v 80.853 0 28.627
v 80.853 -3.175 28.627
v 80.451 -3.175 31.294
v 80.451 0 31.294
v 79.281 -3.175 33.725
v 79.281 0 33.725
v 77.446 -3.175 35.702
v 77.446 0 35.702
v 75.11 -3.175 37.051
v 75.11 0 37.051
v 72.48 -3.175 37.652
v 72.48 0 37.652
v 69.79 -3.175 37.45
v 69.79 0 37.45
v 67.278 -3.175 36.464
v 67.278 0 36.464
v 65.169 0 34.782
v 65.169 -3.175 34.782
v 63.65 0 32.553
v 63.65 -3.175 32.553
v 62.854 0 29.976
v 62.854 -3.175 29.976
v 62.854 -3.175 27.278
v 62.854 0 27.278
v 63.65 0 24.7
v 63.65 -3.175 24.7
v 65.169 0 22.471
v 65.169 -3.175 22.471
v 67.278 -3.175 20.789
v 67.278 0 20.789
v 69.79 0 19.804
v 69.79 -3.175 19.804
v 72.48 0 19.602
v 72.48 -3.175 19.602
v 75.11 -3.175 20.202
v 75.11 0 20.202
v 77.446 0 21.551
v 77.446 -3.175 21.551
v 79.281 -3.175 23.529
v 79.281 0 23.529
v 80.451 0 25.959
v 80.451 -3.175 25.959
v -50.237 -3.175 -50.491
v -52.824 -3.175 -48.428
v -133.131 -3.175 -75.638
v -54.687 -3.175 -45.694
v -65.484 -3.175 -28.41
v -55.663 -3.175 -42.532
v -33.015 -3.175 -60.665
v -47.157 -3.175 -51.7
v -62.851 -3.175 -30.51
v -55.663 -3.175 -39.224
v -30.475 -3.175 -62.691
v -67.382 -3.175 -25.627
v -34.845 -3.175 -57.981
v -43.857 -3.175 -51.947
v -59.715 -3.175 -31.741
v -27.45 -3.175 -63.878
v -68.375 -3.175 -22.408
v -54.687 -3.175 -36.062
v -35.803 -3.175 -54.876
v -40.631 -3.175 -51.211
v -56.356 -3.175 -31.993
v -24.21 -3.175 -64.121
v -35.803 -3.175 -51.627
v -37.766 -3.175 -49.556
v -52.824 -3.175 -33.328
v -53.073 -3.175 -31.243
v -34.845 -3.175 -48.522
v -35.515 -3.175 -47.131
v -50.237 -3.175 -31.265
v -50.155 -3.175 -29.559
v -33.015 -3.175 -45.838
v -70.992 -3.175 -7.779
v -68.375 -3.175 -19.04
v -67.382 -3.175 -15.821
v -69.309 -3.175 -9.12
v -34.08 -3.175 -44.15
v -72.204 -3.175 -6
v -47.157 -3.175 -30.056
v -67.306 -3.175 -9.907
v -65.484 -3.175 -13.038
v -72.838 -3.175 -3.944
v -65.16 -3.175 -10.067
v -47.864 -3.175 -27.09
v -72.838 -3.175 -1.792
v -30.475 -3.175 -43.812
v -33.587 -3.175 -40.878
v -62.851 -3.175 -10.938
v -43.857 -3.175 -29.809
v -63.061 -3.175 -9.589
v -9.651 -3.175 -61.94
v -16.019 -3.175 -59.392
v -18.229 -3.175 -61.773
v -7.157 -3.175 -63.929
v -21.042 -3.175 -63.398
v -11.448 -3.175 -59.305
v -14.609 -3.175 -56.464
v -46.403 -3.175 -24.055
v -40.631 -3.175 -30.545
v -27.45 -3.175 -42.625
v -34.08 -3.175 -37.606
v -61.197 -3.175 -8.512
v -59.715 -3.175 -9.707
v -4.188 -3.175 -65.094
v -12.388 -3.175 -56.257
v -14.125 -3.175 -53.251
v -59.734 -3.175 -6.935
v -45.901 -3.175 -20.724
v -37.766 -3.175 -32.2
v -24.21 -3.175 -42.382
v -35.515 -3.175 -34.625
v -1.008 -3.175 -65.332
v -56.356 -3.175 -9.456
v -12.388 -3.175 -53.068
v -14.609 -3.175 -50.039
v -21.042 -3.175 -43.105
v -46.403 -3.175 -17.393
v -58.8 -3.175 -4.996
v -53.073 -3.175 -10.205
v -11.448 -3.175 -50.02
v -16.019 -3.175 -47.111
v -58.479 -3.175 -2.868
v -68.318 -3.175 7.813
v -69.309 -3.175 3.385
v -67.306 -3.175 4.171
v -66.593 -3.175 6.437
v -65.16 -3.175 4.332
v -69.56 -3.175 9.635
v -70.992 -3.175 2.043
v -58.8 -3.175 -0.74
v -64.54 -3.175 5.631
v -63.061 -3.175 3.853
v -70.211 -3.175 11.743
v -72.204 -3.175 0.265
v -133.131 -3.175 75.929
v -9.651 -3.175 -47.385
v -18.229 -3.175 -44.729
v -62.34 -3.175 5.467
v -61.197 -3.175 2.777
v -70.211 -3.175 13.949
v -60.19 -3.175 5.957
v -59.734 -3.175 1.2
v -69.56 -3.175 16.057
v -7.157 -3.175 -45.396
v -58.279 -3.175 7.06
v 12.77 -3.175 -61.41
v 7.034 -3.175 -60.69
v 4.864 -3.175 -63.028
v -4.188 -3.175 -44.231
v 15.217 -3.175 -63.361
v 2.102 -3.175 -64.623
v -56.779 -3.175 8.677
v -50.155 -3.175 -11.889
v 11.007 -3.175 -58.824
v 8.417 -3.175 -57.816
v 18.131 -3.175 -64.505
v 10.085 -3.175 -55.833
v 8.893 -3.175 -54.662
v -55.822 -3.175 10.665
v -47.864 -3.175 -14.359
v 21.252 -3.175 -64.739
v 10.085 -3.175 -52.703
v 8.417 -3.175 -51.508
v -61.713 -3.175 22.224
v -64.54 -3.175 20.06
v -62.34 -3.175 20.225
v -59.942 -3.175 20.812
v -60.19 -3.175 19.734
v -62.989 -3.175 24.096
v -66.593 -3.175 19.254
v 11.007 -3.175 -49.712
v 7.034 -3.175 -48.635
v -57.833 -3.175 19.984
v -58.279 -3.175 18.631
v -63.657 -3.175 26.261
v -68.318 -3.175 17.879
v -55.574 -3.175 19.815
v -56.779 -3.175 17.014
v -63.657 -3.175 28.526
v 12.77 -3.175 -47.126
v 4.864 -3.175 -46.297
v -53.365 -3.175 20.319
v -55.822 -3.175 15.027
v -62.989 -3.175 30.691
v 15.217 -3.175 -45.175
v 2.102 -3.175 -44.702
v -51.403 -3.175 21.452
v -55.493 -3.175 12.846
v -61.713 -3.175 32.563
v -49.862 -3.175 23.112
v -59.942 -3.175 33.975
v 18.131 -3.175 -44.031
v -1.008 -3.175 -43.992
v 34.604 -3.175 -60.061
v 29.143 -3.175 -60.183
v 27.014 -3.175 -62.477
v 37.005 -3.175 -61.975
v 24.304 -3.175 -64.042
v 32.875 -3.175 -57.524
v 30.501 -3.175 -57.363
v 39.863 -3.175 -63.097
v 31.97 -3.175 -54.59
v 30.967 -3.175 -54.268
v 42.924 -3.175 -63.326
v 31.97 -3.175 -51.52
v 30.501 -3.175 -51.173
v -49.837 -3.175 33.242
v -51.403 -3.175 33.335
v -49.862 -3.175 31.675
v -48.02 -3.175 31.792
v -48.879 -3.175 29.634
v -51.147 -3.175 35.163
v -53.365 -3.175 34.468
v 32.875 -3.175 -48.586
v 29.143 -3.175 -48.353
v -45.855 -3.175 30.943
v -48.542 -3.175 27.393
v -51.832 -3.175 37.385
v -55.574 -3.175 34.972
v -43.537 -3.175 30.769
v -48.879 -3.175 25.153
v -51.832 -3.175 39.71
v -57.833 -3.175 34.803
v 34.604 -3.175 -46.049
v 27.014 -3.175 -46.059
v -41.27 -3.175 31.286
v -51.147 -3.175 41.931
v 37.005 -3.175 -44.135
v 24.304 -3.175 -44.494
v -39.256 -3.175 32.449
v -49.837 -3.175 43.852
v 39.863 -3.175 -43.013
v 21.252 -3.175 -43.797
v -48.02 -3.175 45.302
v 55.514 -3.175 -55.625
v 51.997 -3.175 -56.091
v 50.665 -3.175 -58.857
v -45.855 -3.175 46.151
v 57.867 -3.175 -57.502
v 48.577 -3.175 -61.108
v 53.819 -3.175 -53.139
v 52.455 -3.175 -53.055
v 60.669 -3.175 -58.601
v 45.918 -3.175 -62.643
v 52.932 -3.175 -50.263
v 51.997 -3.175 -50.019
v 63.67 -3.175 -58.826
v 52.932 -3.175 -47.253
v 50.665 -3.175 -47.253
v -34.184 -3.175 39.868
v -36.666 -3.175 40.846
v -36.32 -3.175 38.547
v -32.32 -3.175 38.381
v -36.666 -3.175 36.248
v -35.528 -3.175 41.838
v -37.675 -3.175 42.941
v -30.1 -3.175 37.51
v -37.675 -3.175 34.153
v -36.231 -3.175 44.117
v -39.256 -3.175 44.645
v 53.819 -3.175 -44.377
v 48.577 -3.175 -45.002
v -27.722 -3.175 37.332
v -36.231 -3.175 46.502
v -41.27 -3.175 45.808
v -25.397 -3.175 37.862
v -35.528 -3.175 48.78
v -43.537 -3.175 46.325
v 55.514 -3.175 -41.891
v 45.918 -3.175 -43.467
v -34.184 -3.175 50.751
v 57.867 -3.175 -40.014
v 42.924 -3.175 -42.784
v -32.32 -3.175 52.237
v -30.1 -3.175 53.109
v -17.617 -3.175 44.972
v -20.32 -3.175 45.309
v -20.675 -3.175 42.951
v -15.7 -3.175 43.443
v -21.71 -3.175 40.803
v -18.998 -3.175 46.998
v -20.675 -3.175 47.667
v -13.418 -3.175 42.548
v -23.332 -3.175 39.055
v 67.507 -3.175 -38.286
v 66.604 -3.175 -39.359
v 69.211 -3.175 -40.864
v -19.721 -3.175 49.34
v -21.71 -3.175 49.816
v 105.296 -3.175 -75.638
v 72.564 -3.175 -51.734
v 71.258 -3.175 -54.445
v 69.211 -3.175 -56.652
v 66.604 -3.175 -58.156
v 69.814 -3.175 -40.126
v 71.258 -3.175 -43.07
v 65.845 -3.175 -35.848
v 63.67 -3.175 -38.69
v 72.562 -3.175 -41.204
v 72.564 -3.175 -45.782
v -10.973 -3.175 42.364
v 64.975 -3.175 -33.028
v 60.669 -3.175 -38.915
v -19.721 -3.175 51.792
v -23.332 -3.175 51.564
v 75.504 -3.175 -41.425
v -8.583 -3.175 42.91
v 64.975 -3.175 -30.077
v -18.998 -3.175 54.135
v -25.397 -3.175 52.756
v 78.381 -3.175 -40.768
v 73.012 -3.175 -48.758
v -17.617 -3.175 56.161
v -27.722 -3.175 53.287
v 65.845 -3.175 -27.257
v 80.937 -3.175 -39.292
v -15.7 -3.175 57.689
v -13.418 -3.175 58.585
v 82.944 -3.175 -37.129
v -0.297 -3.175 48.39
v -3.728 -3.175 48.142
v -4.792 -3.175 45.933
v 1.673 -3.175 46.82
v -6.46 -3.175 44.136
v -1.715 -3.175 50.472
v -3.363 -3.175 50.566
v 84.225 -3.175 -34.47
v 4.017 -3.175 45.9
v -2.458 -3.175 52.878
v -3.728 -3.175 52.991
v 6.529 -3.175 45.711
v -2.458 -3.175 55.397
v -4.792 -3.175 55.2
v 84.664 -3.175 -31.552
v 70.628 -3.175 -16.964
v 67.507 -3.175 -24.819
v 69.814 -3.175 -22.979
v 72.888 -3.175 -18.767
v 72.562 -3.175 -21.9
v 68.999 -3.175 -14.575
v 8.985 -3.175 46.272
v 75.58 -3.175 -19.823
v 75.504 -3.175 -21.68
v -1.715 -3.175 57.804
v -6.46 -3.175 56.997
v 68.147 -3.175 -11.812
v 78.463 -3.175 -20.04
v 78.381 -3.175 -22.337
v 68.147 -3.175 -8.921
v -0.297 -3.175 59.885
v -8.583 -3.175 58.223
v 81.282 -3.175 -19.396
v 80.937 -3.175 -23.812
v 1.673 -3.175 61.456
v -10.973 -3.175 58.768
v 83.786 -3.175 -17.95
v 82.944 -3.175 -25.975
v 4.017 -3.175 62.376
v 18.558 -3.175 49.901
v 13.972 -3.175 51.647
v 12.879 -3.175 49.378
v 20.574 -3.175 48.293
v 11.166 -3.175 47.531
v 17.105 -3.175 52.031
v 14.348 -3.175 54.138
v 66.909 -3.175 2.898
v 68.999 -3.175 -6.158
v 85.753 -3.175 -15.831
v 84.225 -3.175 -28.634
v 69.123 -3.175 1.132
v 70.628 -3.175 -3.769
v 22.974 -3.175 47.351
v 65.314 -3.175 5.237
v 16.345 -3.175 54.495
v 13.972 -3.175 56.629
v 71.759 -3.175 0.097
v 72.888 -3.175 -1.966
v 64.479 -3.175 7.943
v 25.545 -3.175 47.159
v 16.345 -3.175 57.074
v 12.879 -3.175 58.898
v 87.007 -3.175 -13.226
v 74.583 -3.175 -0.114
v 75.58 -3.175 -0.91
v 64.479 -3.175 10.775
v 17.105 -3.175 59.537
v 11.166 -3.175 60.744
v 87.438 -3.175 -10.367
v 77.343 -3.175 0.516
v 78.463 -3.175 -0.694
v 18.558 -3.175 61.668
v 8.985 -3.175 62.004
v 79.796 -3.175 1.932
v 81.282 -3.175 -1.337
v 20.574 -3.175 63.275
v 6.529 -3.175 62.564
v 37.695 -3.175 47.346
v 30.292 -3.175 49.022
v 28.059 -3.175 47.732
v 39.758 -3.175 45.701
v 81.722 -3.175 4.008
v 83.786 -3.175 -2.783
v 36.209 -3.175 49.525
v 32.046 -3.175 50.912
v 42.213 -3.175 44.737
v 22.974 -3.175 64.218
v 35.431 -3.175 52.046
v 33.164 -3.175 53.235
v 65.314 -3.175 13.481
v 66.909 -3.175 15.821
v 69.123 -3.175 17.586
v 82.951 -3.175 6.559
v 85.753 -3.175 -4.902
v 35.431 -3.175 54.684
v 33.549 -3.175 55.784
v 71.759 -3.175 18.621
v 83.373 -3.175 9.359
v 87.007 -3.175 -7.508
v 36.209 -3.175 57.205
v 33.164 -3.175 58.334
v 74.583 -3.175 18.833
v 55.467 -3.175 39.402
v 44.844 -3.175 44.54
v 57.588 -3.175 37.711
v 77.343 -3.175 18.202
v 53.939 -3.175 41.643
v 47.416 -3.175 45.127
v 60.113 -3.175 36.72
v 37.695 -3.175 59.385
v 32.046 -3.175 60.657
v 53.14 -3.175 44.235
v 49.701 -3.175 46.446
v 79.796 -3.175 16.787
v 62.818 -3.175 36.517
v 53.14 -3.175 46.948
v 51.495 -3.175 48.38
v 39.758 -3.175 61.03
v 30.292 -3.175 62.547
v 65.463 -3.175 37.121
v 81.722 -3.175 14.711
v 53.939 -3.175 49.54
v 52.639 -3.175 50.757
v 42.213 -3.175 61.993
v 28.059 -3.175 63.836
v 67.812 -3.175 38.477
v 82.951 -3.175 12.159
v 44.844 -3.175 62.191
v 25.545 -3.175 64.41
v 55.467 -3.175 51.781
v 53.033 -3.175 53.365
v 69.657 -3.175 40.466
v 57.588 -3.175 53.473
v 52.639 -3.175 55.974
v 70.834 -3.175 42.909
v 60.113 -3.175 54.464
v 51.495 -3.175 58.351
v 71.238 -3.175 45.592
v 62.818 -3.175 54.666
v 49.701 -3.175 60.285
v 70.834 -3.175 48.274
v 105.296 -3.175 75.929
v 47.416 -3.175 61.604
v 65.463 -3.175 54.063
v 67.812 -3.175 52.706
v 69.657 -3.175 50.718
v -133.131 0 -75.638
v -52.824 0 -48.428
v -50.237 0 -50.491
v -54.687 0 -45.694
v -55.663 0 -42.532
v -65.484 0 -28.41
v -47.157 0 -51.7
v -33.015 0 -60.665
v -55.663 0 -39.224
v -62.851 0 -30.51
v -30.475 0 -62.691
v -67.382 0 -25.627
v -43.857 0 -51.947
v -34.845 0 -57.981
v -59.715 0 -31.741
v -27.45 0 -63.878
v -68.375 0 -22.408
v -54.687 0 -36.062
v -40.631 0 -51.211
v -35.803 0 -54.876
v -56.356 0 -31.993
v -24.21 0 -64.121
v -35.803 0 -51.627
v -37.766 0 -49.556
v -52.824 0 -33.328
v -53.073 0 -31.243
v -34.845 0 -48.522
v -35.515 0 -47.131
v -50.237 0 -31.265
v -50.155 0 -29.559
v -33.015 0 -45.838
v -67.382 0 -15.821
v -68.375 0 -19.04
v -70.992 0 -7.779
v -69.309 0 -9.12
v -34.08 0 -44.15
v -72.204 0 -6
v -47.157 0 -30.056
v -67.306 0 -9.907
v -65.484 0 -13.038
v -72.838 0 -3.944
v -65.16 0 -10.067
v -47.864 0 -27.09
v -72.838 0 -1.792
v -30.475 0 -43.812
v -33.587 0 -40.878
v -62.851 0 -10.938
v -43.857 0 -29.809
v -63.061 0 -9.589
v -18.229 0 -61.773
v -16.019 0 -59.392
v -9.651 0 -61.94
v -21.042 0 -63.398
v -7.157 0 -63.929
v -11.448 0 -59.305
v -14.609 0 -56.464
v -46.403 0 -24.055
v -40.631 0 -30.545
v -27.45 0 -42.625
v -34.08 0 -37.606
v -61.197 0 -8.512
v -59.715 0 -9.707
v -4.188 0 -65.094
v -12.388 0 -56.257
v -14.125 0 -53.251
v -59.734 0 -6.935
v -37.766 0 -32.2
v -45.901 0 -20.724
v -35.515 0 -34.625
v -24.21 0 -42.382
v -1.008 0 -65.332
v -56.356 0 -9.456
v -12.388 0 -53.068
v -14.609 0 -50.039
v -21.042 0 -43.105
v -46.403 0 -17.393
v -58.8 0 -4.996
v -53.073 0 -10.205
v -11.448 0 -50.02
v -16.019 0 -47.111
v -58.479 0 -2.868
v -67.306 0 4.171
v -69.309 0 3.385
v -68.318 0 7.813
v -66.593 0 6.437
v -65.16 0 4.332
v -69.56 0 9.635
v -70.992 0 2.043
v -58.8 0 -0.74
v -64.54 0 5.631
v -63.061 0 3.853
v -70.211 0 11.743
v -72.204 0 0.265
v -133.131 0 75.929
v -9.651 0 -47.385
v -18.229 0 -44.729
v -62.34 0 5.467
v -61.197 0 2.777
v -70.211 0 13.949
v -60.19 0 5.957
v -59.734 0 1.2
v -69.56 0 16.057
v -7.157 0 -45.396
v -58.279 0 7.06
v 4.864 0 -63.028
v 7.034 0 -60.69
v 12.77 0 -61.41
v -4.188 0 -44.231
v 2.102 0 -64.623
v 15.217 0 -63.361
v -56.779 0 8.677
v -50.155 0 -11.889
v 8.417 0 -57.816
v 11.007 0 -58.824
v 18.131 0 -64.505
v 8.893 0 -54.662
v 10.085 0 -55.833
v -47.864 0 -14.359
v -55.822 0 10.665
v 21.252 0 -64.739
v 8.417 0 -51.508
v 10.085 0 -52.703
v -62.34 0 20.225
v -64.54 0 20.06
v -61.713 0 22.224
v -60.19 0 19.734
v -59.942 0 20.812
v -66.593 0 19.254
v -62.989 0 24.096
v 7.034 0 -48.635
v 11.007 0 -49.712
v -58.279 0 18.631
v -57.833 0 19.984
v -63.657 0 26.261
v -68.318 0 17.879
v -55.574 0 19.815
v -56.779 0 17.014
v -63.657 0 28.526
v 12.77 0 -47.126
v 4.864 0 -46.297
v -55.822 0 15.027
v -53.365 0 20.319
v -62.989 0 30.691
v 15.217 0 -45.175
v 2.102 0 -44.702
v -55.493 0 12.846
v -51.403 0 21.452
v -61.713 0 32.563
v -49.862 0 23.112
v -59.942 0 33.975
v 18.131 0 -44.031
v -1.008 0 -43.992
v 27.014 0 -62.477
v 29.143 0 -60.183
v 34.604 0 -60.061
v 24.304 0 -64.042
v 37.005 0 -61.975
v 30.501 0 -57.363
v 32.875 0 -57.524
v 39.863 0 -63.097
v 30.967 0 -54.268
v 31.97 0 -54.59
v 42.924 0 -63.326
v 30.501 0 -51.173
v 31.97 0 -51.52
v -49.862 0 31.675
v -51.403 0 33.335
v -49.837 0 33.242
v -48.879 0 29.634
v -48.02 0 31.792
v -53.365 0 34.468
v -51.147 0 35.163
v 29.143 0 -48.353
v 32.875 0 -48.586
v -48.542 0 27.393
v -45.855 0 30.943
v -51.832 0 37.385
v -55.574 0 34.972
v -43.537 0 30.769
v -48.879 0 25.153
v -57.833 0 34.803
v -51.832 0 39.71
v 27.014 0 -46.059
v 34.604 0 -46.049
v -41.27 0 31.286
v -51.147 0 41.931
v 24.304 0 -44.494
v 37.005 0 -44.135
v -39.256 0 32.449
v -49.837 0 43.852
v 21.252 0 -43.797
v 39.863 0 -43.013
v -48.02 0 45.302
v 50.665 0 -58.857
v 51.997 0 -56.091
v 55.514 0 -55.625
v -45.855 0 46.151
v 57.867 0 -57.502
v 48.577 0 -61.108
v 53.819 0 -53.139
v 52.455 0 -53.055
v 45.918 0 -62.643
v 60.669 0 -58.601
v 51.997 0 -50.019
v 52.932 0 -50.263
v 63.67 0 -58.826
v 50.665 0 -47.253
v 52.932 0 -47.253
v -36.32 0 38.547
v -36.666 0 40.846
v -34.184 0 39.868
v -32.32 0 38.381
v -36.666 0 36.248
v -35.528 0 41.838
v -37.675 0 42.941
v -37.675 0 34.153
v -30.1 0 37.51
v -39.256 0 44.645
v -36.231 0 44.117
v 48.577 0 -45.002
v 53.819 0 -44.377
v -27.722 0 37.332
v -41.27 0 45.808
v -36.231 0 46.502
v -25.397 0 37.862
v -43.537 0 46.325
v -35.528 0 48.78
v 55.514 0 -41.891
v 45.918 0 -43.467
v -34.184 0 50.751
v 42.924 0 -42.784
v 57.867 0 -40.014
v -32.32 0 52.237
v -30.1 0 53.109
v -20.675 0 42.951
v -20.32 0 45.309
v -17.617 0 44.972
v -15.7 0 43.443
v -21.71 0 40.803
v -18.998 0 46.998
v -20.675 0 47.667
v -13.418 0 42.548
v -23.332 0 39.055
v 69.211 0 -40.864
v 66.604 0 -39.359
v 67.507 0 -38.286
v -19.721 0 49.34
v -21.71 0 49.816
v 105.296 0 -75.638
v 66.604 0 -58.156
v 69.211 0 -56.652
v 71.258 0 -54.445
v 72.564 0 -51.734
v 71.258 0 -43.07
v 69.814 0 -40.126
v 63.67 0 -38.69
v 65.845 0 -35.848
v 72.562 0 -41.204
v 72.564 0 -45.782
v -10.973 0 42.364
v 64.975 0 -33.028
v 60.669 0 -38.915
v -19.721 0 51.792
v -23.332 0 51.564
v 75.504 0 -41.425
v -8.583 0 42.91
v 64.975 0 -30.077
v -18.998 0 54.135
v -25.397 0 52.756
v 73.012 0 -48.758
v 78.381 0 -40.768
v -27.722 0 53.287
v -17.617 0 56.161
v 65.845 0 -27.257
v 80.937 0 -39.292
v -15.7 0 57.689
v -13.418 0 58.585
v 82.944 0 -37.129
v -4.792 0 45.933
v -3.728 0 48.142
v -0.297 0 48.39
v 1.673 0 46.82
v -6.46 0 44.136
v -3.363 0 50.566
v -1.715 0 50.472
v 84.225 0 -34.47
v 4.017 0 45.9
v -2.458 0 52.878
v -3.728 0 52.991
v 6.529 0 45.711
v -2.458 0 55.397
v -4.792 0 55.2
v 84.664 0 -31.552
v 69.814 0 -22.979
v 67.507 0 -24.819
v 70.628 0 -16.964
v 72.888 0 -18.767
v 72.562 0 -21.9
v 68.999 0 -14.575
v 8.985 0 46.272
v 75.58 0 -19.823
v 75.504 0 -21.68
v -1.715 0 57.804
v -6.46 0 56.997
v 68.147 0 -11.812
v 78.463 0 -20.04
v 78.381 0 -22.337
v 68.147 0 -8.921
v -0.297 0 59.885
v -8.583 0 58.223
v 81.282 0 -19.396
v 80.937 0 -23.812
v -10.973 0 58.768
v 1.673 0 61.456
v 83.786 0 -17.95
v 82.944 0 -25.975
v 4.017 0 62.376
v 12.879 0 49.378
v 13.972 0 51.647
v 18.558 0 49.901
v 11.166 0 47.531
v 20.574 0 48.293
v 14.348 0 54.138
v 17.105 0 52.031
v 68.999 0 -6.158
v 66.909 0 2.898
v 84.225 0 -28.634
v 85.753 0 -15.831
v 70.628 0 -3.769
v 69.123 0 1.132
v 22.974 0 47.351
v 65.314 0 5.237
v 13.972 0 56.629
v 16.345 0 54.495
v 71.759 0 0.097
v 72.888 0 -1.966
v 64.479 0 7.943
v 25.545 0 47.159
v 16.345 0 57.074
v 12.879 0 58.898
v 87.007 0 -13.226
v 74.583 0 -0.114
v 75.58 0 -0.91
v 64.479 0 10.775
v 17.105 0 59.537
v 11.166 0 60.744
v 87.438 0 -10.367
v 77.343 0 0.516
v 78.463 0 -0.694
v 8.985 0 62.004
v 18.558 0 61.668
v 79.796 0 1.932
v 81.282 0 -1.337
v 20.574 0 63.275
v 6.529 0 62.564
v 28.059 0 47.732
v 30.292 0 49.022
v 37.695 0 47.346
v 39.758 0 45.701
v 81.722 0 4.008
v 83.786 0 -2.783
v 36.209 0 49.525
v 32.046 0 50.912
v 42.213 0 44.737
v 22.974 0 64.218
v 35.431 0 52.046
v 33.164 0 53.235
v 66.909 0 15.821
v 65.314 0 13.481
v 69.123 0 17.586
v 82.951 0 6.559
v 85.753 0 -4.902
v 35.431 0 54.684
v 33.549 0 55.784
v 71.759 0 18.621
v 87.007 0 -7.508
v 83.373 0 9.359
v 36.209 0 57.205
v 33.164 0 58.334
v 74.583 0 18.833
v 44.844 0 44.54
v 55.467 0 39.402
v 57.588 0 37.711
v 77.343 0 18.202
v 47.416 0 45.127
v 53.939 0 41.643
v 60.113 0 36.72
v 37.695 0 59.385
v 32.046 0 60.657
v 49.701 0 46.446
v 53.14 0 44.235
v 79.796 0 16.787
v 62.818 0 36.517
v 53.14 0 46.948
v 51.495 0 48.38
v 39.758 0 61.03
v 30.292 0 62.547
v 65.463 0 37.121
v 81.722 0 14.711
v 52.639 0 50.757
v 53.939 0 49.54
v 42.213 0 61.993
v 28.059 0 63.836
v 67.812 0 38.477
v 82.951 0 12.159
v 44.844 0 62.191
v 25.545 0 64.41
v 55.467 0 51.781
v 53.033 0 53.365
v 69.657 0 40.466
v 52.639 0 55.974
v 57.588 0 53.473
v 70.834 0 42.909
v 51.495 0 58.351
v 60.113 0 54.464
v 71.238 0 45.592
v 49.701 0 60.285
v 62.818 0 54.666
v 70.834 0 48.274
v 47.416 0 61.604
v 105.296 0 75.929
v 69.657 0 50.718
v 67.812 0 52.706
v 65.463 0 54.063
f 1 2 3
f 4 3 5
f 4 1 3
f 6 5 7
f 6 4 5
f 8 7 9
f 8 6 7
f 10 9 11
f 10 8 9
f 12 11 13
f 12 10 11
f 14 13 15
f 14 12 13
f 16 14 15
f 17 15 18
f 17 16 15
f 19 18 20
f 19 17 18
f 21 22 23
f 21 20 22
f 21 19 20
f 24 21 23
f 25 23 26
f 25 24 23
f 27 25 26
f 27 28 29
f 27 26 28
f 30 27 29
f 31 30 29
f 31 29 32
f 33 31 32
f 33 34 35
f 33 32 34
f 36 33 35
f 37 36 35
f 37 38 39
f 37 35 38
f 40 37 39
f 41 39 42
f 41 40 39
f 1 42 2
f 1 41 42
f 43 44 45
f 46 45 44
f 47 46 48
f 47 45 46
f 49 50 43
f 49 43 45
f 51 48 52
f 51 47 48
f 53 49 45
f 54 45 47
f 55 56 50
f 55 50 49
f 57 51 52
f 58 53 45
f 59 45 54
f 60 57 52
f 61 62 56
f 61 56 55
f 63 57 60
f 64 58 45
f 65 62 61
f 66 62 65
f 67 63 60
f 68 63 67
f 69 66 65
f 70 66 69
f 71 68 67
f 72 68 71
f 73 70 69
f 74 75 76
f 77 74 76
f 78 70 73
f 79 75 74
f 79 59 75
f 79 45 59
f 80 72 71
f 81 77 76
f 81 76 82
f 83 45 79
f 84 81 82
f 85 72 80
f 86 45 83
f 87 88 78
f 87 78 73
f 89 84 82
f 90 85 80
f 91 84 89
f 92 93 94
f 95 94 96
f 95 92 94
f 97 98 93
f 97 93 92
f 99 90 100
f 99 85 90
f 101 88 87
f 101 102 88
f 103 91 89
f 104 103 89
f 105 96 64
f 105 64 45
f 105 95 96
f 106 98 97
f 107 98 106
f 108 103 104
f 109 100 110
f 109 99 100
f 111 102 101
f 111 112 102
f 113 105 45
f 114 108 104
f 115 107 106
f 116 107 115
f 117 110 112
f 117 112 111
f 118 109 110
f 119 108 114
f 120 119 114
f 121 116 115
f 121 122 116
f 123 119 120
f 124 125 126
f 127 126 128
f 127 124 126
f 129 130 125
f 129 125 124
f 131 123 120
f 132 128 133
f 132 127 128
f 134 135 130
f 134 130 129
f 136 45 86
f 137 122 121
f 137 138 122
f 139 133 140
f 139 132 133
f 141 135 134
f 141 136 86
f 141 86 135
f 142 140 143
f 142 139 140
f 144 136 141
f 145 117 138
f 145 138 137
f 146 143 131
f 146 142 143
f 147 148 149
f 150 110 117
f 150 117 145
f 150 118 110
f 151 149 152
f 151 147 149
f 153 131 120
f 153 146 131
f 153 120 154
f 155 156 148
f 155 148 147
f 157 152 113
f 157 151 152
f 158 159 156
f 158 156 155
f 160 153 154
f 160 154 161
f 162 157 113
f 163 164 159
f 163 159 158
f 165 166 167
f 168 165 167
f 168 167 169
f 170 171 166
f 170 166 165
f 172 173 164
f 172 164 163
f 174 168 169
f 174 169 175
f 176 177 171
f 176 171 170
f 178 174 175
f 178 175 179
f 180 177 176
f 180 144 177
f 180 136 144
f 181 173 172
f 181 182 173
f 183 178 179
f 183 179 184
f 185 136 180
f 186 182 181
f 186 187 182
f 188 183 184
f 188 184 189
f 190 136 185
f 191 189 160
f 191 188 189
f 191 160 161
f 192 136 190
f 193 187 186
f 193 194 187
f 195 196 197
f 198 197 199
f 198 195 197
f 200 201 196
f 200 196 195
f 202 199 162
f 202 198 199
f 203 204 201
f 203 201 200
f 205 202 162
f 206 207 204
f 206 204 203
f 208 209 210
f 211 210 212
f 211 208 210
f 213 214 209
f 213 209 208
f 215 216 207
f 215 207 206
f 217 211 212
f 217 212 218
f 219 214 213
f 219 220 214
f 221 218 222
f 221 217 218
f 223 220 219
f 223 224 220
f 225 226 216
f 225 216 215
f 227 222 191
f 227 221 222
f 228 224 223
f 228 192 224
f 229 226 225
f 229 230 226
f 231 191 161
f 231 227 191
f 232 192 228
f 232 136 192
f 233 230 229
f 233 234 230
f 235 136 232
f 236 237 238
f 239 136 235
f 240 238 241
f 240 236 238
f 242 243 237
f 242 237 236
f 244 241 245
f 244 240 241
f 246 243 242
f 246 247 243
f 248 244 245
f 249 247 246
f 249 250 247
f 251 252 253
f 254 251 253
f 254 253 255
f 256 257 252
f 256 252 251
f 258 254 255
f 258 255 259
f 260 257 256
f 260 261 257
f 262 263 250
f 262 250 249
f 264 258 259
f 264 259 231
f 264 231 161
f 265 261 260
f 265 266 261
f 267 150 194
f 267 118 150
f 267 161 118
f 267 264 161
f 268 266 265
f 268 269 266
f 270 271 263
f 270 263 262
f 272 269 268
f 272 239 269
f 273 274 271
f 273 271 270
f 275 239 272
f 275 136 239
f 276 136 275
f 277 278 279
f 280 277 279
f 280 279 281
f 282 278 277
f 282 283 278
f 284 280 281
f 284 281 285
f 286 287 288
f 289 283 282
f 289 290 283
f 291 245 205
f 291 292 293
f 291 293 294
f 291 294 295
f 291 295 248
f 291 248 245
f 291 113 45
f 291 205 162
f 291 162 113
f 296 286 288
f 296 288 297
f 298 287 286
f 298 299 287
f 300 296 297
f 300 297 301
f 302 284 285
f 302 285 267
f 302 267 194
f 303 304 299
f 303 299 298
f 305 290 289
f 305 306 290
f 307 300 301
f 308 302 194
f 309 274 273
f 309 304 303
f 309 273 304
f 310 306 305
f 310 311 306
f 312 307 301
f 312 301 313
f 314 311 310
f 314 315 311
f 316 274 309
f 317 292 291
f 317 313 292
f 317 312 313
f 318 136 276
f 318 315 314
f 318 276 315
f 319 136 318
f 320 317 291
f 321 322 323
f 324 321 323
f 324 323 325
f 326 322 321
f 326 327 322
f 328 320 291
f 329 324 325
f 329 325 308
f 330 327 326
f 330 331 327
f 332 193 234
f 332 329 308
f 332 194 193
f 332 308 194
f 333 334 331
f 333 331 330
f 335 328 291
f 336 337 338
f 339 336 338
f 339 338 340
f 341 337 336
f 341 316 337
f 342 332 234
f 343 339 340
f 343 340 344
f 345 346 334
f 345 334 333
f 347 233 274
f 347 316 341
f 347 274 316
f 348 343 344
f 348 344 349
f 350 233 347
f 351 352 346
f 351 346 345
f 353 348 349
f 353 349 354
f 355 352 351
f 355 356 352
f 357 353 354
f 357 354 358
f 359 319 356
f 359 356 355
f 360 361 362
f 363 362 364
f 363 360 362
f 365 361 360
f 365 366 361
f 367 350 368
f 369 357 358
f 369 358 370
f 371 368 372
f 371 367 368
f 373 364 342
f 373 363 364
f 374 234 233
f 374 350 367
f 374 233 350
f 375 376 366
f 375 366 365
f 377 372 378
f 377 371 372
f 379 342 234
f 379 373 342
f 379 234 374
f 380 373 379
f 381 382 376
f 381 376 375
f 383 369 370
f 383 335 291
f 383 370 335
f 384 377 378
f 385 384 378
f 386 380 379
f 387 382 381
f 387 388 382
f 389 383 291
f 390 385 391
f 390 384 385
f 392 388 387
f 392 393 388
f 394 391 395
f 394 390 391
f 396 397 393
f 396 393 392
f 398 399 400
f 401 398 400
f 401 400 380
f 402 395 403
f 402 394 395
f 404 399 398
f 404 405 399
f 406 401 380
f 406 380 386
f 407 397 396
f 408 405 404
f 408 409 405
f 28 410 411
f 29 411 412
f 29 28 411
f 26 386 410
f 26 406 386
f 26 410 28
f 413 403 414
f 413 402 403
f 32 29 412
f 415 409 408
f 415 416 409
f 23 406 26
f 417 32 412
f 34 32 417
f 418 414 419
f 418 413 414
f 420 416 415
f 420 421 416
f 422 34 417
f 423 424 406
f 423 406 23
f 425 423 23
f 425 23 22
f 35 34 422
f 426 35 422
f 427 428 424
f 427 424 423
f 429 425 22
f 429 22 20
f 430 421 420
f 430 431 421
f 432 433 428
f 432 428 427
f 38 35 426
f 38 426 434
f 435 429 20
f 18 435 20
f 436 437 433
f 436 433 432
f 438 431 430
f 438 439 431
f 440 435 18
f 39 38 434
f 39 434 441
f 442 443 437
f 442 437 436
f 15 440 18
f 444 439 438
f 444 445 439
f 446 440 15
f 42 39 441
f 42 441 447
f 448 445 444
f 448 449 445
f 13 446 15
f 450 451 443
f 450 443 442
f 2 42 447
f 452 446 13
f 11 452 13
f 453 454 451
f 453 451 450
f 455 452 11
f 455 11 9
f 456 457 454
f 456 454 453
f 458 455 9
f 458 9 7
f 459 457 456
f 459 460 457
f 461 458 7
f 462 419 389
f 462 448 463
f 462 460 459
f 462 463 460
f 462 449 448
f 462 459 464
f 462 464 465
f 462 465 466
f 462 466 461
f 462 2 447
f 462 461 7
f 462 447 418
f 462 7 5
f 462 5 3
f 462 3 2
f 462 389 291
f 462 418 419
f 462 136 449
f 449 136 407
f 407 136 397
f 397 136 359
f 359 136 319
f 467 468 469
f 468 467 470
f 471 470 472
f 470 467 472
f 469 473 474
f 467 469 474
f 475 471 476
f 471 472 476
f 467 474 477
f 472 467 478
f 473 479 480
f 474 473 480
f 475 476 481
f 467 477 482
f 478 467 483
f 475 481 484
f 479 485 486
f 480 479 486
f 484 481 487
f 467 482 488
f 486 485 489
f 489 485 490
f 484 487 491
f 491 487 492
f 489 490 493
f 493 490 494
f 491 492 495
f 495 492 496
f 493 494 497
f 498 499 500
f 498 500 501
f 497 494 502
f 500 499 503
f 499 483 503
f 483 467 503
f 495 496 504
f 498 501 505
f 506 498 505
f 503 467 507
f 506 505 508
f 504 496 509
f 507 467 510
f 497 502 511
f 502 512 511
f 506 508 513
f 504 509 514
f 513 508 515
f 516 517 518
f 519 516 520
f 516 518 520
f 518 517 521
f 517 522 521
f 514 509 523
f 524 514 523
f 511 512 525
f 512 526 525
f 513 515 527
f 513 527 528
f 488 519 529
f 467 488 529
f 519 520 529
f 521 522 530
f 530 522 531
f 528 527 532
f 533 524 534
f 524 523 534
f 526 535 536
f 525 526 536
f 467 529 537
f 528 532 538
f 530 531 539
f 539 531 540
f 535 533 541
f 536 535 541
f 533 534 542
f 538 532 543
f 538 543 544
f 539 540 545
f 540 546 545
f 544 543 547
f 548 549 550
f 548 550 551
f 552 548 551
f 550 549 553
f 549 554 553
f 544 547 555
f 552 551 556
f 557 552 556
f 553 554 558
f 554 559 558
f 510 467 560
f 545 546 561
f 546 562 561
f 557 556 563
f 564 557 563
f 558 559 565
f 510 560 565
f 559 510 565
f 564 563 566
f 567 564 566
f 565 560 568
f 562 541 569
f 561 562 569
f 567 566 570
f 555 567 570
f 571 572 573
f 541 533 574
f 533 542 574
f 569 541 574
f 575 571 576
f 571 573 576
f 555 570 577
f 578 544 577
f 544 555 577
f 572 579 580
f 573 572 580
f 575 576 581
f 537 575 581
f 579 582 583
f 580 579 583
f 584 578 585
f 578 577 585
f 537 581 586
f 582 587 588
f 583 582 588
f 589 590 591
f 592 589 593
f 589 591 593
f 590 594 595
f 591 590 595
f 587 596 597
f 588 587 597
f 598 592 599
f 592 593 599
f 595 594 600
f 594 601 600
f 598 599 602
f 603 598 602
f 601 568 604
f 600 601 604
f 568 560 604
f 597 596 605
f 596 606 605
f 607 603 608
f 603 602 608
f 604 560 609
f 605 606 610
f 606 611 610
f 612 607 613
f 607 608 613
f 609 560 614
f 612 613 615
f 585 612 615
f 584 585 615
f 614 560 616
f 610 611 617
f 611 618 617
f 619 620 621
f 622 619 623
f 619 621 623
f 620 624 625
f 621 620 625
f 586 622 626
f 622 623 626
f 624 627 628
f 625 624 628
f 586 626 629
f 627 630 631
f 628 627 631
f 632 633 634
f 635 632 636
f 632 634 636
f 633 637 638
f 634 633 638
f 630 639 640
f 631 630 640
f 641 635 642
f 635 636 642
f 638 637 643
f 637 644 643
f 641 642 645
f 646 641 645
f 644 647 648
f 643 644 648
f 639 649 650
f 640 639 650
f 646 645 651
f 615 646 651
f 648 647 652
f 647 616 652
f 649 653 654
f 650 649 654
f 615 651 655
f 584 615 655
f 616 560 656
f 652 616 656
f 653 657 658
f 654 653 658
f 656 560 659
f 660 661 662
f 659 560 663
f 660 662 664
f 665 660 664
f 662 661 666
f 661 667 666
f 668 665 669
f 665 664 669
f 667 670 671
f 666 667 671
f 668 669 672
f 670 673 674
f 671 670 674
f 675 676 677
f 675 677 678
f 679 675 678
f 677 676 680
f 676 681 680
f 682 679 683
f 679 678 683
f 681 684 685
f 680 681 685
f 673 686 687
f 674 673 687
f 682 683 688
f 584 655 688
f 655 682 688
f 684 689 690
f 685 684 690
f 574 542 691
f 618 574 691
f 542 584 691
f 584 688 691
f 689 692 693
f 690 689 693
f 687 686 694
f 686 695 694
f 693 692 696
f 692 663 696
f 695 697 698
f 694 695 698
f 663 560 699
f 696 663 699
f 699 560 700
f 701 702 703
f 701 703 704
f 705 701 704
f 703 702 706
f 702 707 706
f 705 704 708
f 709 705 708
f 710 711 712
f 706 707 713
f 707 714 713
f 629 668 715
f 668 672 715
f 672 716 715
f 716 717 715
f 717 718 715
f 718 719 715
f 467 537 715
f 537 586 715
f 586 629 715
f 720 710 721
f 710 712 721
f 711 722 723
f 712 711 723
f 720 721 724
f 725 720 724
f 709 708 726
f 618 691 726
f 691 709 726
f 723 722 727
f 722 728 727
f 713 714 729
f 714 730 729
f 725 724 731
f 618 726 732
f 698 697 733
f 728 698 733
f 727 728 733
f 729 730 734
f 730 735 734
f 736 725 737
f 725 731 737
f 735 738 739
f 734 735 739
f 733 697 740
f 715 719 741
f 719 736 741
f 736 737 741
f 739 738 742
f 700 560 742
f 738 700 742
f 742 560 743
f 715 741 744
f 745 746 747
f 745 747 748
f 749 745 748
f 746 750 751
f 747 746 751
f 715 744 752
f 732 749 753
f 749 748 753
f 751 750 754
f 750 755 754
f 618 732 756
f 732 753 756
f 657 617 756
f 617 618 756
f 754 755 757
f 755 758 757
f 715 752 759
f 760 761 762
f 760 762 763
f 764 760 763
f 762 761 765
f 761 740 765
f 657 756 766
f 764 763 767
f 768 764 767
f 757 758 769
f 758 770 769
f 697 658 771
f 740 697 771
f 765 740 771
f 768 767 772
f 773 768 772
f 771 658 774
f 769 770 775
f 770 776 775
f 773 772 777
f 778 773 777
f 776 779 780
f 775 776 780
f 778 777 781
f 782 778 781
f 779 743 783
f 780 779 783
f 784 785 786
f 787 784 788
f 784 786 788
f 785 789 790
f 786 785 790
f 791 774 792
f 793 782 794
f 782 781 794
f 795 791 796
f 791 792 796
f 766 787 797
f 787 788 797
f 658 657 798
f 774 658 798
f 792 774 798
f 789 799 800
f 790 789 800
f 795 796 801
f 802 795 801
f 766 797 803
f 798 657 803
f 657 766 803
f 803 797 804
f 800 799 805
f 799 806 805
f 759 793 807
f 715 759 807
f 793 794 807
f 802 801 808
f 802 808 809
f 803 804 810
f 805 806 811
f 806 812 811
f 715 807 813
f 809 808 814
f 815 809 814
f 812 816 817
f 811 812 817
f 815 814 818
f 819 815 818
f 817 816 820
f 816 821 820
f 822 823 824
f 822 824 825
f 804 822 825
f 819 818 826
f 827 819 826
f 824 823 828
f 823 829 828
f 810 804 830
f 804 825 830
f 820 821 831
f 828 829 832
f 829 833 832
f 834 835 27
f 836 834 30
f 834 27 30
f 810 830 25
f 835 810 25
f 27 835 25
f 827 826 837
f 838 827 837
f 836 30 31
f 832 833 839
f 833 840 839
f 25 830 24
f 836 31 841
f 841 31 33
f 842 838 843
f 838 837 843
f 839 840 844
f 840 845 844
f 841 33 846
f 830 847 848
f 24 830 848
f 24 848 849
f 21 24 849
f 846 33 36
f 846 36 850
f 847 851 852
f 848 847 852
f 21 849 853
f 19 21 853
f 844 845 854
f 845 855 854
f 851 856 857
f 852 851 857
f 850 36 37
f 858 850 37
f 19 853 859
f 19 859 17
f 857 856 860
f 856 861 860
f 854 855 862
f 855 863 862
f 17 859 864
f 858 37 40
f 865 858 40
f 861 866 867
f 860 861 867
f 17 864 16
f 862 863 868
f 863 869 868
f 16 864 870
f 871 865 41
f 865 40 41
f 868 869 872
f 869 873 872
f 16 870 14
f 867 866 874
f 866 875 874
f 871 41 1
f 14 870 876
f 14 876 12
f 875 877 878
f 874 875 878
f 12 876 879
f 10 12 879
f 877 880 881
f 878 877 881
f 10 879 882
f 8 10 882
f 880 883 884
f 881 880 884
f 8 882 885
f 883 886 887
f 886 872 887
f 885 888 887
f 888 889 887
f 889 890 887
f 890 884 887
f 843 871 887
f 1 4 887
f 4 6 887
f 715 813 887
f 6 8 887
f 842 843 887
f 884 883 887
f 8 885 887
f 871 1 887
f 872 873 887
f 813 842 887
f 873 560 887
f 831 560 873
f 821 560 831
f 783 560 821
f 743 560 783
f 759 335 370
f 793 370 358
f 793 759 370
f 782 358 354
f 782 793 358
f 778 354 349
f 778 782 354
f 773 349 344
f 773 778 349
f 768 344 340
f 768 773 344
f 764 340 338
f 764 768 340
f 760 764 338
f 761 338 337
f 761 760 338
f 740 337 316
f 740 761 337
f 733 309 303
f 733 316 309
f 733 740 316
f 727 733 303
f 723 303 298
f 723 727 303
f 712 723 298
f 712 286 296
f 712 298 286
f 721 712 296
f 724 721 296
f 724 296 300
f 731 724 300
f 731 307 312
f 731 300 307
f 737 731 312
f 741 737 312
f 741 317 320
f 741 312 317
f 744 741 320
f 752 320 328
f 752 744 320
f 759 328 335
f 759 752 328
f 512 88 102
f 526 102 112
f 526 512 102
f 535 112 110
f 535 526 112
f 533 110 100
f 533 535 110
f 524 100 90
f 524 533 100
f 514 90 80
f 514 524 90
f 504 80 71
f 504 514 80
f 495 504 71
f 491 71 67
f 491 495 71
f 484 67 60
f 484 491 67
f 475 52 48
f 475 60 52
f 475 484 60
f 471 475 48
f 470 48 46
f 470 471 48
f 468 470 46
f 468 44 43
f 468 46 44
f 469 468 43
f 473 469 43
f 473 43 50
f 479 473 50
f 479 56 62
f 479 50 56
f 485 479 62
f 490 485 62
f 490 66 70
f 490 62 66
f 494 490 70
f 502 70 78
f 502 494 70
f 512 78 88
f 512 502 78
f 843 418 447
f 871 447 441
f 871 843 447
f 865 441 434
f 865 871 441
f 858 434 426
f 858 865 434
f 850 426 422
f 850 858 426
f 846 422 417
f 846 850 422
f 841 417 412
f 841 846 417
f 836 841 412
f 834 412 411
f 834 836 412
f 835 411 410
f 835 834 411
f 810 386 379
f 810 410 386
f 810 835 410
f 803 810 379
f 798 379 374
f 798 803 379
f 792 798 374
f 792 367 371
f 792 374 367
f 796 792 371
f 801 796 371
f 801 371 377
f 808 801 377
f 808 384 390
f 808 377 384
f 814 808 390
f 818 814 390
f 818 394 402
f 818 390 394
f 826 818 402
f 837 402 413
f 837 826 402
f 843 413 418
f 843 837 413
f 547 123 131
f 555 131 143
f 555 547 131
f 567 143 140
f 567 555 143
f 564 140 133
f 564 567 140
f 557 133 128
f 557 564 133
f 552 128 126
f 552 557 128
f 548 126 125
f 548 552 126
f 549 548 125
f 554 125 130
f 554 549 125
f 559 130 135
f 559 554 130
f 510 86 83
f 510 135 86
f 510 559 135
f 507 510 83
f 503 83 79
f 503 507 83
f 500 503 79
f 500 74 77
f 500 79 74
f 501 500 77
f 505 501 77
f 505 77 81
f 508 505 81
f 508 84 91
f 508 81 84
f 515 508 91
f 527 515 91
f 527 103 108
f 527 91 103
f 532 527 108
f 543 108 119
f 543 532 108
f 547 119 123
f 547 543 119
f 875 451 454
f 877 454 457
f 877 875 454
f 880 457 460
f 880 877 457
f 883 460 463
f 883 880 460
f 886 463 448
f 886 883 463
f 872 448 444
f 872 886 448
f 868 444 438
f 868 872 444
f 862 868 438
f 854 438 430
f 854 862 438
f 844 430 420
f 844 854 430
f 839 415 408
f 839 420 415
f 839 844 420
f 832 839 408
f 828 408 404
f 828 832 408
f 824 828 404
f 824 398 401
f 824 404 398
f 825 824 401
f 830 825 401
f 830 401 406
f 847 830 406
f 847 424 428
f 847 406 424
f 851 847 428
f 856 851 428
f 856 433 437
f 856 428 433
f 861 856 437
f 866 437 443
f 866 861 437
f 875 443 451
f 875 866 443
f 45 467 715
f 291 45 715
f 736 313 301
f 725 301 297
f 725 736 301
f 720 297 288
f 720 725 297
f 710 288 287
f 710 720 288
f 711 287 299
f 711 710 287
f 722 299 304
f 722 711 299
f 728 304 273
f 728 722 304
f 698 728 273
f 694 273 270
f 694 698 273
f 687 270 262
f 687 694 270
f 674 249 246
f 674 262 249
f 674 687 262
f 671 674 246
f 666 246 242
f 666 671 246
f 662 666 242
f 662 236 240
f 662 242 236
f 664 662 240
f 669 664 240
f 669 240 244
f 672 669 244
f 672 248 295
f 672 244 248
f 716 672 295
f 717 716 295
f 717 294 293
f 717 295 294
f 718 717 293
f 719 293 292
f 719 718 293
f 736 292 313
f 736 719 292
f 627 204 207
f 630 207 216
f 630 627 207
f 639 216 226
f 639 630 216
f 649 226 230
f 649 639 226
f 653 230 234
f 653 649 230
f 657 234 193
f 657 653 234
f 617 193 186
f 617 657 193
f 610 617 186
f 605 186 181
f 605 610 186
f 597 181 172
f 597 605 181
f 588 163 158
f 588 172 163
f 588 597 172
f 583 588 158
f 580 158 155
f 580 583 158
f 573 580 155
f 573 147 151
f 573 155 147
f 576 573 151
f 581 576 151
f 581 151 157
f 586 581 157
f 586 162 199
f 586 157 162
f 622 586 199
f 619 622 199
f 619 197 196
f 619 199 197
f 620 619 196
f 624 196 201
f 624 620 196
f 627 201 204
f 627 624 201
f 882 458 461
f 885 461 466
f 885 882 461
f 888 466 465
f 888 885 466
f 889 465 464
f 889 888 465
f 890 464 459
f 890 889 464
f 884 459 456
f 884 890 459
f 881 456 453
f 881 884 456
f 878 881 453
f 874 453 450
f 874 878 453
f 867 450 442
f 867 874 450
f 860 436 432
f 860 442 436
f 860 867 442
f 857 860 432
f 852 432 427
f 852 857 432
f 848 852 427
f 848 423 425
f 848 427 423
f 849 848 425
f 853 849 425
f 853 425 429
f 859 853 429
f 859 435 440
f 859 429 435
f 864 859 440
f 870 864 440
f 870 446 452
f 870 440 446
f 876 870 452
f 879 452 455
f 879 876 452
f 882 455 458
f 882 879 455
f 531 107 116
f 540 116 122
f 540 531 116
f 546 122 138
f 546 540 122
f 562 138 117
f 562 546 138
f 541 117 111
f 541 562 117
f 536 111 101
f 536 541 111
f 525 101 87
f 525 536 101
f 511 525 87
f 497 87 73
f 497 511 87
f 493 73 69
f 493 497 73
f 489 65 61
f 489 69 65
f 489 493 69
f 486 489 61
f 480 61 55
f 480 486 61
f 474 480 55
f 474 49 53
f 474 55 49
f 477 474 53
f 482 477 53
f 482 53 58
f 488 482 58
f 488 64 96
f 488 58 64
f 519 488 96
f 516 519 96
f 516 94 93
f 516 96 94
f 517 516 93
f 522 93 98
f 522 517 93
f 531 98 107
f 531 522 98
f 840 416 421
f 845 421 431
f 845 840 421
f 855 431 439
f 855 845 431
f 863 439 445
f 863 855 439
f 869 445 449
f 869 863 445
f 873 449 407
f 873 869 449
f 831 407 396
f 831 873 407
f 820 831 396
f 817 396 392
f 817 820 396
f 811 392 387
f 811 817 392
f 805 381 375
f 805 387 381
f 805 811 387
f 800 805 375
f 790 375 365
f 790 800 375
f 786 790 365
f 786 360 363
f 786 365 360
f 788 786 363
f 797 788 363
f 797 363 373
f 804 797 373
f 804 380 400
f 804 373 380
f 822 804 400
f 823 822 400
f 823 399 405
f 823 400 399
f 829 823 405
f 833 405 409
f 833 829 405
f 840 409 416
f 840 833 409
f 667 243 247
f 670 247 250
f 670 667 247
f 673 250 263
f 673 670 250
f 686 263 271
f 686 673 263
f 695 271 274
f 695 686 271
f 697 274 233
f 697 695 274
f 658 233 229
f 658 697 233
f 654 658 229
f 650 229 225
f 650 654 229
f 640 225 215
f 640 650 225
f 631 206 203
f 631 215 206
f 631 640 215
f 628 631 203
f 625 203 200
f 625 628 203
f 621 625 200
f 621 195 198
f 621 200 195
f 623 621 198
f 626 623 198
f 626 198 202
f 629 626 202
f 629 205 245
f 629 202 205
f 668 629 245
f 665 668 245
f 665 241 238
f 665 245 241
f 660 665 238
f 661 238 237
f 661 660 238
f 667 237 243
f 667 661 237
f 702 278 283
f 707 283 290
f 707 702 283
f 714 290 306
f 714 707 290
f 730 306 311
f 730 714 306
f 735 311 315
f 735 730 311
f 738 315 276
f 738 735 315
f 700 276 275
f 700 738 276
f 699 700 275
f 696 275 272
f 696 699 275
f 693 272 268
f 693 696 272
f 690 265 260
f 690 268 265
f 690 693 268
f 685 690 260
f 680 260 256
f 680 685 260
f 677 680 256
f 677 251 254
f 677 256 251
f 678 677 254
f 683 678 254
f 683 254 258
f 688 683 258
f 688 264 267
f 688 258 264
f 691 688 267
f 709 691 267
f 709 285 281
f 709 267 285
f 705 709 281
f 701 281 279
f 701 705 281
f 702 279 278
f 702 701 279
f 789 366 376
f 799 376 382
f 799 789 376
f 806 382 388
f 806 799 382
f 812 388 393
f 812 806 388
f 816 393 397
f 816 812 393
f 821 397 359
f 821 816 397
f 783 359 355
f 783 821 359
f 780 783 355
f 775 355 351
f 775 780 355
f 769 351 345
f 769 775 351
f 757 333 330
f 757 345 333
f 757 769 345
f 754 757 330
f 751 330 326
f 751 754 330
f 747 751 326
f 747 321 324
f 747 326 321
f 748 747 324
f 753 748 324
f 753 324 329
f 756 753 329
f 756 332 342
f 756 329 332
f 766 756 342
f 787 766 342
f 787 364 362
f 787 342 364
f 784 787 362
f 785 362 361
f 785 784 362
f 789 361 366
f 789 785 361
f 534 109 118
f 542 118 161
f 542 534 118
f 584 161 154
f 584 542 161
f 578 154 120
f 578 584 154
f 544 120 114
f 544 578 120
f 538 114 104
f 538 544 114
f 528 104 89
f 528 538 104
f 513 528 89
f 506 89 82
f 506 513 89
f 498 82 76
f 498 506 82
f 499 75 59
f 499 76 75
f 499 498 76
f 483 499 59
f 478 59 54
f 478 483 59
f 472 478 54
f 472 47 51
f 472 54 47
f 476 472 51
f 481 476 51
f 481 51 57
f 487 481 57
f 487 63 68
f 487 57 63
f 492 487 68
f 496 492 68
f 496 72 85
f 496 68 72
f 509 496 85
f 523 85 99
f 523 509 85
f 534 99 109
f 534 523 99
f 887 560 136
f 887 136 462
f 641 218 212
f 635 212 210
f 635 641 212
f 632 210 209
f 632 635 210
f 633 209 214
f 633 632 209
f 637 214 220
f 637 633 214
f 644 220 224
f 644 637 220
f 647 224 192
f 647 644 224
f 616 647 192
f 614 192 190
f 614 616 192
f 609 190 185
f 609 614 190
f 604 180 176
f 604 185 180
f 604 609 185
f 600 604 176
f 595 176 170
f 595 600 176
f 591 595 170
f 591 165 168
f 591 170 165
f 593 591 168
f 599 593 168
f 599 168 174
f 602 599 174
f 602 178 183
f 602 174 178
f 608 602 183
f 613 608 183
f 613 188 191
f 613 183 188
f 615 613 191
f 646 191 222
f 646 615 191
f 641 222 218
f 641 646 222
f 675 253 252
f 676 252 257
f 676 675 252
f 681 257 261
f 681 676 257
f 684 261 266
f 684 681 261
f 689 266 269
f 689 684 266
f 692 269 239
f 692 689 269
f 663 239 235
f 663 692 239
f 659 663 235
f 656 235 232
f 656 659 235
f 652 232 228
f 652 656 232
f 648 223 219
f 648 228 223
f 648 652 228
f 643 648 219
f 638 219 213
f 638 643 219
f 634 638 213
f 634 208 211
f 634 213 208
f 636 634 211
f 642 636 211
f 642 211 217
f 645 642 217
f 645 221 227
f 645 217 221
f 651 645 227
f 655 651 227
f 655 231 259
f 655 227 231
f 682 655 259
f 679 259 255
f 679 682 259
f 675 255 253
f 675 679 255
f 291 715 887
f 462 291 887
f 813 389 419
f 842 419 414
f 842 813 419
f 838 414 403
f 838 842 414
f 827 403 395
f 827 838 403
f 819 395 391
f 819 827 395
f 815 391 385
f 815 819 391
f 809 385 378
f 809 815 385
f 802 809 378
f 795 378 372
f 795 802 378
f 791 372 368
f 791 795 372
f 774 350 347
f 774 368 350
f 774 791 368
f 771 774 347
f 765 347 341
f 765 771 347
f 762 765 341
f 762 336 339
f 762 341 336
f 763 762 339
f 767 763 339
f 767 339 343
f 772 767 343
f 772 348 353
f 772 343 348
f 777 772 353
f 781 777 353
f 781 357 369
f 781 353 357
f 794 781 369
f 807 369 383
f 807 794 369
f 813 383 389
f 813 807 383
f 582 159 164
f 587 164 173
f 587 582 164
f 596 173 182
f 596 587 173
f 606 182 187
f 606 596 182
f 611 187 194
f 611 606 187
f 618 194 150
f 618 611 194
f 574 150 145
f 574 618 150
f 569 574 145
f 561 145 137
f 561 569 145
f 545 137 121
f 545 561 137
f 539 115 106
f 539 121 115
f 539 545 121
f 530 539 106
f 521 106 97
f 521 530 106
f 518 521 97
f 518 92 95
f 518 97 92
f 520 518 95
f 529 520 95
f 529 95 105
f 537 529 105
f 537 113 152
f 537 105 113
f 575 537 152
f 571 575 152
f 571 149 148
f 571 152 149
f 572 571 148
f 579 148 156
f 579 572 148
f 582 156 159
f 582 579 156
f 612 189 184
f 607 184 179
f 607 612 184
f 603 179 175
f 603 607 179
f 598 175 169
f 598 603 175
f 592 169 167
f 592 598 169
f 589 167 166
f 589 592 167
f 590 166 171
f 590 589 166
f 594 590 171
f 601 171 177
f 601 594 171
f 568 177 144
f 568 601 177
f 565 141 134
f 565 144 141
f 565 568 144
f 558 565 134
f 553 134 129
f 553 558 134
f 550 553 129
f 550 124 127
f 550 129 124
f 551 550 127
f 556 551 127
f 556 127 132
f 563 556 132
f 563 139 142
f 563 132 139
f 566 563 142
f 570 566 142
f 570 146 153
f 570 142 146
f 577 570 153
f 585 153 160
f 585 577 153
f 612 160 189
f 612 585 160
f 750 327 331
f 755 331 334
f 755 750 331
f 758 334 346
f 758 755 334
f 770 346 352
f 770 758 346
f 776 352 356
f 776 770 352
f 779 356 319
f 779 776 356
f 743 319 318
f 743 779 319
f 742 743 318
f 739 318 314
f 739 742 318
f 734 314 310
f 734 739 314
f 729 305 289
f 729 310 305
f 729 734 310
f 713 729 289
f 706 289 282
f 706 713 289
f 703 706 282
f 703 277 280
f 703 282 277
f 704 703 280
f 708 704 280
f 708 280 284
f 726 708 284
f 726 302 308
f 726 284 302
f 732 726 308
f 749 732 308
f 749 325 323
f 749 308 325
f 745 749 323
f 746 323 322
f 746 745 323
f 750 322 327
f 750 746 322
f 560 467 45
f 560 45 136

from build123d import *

# Parameters (mm, degrees)
F2_W     = 238.426886
F2_H     = 151.567214
F3_DEPTH = 3.175
F1_R     = 9.05
F1_R_2   = 9.5
F1_R_3   = 9.7
F1_R_4   = 9.9
F1_R_5   = 10.3
F1_R_6   = 10.5
F1_R_7   = 10.7
F1_R_8   = 10.9
F1_R_9   = 11.1
F1_R_10  = 11.3
F1_R_11  = 10.0965
F0_R     = 7.22
F0_R_2   = 7.4
F0_R_3   = 7.6
F0_R_4   = 7.8
F0_R_5   = 8
F0_R_6   = 8.225
F0_R_7   = 8.45
F0_R_8   = 8.65
F0_R_9   = 8.85
F0_R_10  = 9.1
F4_DEPTH = 25.4


with BuildPart() as f3:
    # F2 (on Front) → F3 (new body)
    with BuildSketch(Plane.XZ):
        with Locations((-13.917122, 0.145737)):
            Rectangle(F2_W, F2_H)
    extrude(amount=F3_DEPTH)

    # F1 (on Front) + F0 (on Front) → F4 (cut)
    with BuildSketch(Plane.XZ):
        with Locations((71.803339, 28.626817)):
            Circle(F1_R)
        with Locations((73.872736, 9.359167)):
            Circle(F1_R_2)
        with Locations((77.738432, -10.366699)):
            Circle(F1_R_3)
        with Locations((74.764473, -31.552281)):
            Circle(F1_R_4)
        with Locations((42.154603, -53.0548)):
            Circle(F1_R_5)
        with Locations((20.467432, -54.267971)):
            Circle(F1_R_6)
        with Locations((-1.80723, -54.662366)):
            Circle(F1_R_7)
        with Locations((-25.024595, -53.251462)):
            Circle(F1_R_8)
        with Locations((-44.686638, -40.878124)):
            Circle(F1_R_9)
        with Locations((-57.200898, -20.724166)):
            Circle(F1_R_10)
        with Locations((62.915616, -48.757901)):
            Circle(F1_R_11)
    with BuildSketch(Plane.XZ):
        with Locations((-65.699088, -2.867658)):
            Circle(F0_R)
        with Locations((-62.893169, 12.845844)):
            Circle(F0_R_2)
        with Locations((-56.141507, 27.393481)):
            Circle(F0_R_3)
        with Locations((-44.119534, 38.547034)):
            Circle(F0_R_4)
        with Locations((-28.320049, 45.309286)):
            Circle(F0_R_5)
        with Locations((-11.58786, 50.566368)):
            Circle(F0_R_6)
        with Locations((5.897778, 54.137864)):
            Circle(F0_R_7)
        with Locations((24.898611, 55.78438)):
            Circle(F0_R_8)
        with Locations((44.18264, 53.365339)):
            Circle(F0_R_9)
        with Locations((62.138096, 45.591767)):
            Circle(F0_R_10)
    extrude(amount=F4_DEPTH, mode=Mode.SUBTRACT)


solid = f3.part
